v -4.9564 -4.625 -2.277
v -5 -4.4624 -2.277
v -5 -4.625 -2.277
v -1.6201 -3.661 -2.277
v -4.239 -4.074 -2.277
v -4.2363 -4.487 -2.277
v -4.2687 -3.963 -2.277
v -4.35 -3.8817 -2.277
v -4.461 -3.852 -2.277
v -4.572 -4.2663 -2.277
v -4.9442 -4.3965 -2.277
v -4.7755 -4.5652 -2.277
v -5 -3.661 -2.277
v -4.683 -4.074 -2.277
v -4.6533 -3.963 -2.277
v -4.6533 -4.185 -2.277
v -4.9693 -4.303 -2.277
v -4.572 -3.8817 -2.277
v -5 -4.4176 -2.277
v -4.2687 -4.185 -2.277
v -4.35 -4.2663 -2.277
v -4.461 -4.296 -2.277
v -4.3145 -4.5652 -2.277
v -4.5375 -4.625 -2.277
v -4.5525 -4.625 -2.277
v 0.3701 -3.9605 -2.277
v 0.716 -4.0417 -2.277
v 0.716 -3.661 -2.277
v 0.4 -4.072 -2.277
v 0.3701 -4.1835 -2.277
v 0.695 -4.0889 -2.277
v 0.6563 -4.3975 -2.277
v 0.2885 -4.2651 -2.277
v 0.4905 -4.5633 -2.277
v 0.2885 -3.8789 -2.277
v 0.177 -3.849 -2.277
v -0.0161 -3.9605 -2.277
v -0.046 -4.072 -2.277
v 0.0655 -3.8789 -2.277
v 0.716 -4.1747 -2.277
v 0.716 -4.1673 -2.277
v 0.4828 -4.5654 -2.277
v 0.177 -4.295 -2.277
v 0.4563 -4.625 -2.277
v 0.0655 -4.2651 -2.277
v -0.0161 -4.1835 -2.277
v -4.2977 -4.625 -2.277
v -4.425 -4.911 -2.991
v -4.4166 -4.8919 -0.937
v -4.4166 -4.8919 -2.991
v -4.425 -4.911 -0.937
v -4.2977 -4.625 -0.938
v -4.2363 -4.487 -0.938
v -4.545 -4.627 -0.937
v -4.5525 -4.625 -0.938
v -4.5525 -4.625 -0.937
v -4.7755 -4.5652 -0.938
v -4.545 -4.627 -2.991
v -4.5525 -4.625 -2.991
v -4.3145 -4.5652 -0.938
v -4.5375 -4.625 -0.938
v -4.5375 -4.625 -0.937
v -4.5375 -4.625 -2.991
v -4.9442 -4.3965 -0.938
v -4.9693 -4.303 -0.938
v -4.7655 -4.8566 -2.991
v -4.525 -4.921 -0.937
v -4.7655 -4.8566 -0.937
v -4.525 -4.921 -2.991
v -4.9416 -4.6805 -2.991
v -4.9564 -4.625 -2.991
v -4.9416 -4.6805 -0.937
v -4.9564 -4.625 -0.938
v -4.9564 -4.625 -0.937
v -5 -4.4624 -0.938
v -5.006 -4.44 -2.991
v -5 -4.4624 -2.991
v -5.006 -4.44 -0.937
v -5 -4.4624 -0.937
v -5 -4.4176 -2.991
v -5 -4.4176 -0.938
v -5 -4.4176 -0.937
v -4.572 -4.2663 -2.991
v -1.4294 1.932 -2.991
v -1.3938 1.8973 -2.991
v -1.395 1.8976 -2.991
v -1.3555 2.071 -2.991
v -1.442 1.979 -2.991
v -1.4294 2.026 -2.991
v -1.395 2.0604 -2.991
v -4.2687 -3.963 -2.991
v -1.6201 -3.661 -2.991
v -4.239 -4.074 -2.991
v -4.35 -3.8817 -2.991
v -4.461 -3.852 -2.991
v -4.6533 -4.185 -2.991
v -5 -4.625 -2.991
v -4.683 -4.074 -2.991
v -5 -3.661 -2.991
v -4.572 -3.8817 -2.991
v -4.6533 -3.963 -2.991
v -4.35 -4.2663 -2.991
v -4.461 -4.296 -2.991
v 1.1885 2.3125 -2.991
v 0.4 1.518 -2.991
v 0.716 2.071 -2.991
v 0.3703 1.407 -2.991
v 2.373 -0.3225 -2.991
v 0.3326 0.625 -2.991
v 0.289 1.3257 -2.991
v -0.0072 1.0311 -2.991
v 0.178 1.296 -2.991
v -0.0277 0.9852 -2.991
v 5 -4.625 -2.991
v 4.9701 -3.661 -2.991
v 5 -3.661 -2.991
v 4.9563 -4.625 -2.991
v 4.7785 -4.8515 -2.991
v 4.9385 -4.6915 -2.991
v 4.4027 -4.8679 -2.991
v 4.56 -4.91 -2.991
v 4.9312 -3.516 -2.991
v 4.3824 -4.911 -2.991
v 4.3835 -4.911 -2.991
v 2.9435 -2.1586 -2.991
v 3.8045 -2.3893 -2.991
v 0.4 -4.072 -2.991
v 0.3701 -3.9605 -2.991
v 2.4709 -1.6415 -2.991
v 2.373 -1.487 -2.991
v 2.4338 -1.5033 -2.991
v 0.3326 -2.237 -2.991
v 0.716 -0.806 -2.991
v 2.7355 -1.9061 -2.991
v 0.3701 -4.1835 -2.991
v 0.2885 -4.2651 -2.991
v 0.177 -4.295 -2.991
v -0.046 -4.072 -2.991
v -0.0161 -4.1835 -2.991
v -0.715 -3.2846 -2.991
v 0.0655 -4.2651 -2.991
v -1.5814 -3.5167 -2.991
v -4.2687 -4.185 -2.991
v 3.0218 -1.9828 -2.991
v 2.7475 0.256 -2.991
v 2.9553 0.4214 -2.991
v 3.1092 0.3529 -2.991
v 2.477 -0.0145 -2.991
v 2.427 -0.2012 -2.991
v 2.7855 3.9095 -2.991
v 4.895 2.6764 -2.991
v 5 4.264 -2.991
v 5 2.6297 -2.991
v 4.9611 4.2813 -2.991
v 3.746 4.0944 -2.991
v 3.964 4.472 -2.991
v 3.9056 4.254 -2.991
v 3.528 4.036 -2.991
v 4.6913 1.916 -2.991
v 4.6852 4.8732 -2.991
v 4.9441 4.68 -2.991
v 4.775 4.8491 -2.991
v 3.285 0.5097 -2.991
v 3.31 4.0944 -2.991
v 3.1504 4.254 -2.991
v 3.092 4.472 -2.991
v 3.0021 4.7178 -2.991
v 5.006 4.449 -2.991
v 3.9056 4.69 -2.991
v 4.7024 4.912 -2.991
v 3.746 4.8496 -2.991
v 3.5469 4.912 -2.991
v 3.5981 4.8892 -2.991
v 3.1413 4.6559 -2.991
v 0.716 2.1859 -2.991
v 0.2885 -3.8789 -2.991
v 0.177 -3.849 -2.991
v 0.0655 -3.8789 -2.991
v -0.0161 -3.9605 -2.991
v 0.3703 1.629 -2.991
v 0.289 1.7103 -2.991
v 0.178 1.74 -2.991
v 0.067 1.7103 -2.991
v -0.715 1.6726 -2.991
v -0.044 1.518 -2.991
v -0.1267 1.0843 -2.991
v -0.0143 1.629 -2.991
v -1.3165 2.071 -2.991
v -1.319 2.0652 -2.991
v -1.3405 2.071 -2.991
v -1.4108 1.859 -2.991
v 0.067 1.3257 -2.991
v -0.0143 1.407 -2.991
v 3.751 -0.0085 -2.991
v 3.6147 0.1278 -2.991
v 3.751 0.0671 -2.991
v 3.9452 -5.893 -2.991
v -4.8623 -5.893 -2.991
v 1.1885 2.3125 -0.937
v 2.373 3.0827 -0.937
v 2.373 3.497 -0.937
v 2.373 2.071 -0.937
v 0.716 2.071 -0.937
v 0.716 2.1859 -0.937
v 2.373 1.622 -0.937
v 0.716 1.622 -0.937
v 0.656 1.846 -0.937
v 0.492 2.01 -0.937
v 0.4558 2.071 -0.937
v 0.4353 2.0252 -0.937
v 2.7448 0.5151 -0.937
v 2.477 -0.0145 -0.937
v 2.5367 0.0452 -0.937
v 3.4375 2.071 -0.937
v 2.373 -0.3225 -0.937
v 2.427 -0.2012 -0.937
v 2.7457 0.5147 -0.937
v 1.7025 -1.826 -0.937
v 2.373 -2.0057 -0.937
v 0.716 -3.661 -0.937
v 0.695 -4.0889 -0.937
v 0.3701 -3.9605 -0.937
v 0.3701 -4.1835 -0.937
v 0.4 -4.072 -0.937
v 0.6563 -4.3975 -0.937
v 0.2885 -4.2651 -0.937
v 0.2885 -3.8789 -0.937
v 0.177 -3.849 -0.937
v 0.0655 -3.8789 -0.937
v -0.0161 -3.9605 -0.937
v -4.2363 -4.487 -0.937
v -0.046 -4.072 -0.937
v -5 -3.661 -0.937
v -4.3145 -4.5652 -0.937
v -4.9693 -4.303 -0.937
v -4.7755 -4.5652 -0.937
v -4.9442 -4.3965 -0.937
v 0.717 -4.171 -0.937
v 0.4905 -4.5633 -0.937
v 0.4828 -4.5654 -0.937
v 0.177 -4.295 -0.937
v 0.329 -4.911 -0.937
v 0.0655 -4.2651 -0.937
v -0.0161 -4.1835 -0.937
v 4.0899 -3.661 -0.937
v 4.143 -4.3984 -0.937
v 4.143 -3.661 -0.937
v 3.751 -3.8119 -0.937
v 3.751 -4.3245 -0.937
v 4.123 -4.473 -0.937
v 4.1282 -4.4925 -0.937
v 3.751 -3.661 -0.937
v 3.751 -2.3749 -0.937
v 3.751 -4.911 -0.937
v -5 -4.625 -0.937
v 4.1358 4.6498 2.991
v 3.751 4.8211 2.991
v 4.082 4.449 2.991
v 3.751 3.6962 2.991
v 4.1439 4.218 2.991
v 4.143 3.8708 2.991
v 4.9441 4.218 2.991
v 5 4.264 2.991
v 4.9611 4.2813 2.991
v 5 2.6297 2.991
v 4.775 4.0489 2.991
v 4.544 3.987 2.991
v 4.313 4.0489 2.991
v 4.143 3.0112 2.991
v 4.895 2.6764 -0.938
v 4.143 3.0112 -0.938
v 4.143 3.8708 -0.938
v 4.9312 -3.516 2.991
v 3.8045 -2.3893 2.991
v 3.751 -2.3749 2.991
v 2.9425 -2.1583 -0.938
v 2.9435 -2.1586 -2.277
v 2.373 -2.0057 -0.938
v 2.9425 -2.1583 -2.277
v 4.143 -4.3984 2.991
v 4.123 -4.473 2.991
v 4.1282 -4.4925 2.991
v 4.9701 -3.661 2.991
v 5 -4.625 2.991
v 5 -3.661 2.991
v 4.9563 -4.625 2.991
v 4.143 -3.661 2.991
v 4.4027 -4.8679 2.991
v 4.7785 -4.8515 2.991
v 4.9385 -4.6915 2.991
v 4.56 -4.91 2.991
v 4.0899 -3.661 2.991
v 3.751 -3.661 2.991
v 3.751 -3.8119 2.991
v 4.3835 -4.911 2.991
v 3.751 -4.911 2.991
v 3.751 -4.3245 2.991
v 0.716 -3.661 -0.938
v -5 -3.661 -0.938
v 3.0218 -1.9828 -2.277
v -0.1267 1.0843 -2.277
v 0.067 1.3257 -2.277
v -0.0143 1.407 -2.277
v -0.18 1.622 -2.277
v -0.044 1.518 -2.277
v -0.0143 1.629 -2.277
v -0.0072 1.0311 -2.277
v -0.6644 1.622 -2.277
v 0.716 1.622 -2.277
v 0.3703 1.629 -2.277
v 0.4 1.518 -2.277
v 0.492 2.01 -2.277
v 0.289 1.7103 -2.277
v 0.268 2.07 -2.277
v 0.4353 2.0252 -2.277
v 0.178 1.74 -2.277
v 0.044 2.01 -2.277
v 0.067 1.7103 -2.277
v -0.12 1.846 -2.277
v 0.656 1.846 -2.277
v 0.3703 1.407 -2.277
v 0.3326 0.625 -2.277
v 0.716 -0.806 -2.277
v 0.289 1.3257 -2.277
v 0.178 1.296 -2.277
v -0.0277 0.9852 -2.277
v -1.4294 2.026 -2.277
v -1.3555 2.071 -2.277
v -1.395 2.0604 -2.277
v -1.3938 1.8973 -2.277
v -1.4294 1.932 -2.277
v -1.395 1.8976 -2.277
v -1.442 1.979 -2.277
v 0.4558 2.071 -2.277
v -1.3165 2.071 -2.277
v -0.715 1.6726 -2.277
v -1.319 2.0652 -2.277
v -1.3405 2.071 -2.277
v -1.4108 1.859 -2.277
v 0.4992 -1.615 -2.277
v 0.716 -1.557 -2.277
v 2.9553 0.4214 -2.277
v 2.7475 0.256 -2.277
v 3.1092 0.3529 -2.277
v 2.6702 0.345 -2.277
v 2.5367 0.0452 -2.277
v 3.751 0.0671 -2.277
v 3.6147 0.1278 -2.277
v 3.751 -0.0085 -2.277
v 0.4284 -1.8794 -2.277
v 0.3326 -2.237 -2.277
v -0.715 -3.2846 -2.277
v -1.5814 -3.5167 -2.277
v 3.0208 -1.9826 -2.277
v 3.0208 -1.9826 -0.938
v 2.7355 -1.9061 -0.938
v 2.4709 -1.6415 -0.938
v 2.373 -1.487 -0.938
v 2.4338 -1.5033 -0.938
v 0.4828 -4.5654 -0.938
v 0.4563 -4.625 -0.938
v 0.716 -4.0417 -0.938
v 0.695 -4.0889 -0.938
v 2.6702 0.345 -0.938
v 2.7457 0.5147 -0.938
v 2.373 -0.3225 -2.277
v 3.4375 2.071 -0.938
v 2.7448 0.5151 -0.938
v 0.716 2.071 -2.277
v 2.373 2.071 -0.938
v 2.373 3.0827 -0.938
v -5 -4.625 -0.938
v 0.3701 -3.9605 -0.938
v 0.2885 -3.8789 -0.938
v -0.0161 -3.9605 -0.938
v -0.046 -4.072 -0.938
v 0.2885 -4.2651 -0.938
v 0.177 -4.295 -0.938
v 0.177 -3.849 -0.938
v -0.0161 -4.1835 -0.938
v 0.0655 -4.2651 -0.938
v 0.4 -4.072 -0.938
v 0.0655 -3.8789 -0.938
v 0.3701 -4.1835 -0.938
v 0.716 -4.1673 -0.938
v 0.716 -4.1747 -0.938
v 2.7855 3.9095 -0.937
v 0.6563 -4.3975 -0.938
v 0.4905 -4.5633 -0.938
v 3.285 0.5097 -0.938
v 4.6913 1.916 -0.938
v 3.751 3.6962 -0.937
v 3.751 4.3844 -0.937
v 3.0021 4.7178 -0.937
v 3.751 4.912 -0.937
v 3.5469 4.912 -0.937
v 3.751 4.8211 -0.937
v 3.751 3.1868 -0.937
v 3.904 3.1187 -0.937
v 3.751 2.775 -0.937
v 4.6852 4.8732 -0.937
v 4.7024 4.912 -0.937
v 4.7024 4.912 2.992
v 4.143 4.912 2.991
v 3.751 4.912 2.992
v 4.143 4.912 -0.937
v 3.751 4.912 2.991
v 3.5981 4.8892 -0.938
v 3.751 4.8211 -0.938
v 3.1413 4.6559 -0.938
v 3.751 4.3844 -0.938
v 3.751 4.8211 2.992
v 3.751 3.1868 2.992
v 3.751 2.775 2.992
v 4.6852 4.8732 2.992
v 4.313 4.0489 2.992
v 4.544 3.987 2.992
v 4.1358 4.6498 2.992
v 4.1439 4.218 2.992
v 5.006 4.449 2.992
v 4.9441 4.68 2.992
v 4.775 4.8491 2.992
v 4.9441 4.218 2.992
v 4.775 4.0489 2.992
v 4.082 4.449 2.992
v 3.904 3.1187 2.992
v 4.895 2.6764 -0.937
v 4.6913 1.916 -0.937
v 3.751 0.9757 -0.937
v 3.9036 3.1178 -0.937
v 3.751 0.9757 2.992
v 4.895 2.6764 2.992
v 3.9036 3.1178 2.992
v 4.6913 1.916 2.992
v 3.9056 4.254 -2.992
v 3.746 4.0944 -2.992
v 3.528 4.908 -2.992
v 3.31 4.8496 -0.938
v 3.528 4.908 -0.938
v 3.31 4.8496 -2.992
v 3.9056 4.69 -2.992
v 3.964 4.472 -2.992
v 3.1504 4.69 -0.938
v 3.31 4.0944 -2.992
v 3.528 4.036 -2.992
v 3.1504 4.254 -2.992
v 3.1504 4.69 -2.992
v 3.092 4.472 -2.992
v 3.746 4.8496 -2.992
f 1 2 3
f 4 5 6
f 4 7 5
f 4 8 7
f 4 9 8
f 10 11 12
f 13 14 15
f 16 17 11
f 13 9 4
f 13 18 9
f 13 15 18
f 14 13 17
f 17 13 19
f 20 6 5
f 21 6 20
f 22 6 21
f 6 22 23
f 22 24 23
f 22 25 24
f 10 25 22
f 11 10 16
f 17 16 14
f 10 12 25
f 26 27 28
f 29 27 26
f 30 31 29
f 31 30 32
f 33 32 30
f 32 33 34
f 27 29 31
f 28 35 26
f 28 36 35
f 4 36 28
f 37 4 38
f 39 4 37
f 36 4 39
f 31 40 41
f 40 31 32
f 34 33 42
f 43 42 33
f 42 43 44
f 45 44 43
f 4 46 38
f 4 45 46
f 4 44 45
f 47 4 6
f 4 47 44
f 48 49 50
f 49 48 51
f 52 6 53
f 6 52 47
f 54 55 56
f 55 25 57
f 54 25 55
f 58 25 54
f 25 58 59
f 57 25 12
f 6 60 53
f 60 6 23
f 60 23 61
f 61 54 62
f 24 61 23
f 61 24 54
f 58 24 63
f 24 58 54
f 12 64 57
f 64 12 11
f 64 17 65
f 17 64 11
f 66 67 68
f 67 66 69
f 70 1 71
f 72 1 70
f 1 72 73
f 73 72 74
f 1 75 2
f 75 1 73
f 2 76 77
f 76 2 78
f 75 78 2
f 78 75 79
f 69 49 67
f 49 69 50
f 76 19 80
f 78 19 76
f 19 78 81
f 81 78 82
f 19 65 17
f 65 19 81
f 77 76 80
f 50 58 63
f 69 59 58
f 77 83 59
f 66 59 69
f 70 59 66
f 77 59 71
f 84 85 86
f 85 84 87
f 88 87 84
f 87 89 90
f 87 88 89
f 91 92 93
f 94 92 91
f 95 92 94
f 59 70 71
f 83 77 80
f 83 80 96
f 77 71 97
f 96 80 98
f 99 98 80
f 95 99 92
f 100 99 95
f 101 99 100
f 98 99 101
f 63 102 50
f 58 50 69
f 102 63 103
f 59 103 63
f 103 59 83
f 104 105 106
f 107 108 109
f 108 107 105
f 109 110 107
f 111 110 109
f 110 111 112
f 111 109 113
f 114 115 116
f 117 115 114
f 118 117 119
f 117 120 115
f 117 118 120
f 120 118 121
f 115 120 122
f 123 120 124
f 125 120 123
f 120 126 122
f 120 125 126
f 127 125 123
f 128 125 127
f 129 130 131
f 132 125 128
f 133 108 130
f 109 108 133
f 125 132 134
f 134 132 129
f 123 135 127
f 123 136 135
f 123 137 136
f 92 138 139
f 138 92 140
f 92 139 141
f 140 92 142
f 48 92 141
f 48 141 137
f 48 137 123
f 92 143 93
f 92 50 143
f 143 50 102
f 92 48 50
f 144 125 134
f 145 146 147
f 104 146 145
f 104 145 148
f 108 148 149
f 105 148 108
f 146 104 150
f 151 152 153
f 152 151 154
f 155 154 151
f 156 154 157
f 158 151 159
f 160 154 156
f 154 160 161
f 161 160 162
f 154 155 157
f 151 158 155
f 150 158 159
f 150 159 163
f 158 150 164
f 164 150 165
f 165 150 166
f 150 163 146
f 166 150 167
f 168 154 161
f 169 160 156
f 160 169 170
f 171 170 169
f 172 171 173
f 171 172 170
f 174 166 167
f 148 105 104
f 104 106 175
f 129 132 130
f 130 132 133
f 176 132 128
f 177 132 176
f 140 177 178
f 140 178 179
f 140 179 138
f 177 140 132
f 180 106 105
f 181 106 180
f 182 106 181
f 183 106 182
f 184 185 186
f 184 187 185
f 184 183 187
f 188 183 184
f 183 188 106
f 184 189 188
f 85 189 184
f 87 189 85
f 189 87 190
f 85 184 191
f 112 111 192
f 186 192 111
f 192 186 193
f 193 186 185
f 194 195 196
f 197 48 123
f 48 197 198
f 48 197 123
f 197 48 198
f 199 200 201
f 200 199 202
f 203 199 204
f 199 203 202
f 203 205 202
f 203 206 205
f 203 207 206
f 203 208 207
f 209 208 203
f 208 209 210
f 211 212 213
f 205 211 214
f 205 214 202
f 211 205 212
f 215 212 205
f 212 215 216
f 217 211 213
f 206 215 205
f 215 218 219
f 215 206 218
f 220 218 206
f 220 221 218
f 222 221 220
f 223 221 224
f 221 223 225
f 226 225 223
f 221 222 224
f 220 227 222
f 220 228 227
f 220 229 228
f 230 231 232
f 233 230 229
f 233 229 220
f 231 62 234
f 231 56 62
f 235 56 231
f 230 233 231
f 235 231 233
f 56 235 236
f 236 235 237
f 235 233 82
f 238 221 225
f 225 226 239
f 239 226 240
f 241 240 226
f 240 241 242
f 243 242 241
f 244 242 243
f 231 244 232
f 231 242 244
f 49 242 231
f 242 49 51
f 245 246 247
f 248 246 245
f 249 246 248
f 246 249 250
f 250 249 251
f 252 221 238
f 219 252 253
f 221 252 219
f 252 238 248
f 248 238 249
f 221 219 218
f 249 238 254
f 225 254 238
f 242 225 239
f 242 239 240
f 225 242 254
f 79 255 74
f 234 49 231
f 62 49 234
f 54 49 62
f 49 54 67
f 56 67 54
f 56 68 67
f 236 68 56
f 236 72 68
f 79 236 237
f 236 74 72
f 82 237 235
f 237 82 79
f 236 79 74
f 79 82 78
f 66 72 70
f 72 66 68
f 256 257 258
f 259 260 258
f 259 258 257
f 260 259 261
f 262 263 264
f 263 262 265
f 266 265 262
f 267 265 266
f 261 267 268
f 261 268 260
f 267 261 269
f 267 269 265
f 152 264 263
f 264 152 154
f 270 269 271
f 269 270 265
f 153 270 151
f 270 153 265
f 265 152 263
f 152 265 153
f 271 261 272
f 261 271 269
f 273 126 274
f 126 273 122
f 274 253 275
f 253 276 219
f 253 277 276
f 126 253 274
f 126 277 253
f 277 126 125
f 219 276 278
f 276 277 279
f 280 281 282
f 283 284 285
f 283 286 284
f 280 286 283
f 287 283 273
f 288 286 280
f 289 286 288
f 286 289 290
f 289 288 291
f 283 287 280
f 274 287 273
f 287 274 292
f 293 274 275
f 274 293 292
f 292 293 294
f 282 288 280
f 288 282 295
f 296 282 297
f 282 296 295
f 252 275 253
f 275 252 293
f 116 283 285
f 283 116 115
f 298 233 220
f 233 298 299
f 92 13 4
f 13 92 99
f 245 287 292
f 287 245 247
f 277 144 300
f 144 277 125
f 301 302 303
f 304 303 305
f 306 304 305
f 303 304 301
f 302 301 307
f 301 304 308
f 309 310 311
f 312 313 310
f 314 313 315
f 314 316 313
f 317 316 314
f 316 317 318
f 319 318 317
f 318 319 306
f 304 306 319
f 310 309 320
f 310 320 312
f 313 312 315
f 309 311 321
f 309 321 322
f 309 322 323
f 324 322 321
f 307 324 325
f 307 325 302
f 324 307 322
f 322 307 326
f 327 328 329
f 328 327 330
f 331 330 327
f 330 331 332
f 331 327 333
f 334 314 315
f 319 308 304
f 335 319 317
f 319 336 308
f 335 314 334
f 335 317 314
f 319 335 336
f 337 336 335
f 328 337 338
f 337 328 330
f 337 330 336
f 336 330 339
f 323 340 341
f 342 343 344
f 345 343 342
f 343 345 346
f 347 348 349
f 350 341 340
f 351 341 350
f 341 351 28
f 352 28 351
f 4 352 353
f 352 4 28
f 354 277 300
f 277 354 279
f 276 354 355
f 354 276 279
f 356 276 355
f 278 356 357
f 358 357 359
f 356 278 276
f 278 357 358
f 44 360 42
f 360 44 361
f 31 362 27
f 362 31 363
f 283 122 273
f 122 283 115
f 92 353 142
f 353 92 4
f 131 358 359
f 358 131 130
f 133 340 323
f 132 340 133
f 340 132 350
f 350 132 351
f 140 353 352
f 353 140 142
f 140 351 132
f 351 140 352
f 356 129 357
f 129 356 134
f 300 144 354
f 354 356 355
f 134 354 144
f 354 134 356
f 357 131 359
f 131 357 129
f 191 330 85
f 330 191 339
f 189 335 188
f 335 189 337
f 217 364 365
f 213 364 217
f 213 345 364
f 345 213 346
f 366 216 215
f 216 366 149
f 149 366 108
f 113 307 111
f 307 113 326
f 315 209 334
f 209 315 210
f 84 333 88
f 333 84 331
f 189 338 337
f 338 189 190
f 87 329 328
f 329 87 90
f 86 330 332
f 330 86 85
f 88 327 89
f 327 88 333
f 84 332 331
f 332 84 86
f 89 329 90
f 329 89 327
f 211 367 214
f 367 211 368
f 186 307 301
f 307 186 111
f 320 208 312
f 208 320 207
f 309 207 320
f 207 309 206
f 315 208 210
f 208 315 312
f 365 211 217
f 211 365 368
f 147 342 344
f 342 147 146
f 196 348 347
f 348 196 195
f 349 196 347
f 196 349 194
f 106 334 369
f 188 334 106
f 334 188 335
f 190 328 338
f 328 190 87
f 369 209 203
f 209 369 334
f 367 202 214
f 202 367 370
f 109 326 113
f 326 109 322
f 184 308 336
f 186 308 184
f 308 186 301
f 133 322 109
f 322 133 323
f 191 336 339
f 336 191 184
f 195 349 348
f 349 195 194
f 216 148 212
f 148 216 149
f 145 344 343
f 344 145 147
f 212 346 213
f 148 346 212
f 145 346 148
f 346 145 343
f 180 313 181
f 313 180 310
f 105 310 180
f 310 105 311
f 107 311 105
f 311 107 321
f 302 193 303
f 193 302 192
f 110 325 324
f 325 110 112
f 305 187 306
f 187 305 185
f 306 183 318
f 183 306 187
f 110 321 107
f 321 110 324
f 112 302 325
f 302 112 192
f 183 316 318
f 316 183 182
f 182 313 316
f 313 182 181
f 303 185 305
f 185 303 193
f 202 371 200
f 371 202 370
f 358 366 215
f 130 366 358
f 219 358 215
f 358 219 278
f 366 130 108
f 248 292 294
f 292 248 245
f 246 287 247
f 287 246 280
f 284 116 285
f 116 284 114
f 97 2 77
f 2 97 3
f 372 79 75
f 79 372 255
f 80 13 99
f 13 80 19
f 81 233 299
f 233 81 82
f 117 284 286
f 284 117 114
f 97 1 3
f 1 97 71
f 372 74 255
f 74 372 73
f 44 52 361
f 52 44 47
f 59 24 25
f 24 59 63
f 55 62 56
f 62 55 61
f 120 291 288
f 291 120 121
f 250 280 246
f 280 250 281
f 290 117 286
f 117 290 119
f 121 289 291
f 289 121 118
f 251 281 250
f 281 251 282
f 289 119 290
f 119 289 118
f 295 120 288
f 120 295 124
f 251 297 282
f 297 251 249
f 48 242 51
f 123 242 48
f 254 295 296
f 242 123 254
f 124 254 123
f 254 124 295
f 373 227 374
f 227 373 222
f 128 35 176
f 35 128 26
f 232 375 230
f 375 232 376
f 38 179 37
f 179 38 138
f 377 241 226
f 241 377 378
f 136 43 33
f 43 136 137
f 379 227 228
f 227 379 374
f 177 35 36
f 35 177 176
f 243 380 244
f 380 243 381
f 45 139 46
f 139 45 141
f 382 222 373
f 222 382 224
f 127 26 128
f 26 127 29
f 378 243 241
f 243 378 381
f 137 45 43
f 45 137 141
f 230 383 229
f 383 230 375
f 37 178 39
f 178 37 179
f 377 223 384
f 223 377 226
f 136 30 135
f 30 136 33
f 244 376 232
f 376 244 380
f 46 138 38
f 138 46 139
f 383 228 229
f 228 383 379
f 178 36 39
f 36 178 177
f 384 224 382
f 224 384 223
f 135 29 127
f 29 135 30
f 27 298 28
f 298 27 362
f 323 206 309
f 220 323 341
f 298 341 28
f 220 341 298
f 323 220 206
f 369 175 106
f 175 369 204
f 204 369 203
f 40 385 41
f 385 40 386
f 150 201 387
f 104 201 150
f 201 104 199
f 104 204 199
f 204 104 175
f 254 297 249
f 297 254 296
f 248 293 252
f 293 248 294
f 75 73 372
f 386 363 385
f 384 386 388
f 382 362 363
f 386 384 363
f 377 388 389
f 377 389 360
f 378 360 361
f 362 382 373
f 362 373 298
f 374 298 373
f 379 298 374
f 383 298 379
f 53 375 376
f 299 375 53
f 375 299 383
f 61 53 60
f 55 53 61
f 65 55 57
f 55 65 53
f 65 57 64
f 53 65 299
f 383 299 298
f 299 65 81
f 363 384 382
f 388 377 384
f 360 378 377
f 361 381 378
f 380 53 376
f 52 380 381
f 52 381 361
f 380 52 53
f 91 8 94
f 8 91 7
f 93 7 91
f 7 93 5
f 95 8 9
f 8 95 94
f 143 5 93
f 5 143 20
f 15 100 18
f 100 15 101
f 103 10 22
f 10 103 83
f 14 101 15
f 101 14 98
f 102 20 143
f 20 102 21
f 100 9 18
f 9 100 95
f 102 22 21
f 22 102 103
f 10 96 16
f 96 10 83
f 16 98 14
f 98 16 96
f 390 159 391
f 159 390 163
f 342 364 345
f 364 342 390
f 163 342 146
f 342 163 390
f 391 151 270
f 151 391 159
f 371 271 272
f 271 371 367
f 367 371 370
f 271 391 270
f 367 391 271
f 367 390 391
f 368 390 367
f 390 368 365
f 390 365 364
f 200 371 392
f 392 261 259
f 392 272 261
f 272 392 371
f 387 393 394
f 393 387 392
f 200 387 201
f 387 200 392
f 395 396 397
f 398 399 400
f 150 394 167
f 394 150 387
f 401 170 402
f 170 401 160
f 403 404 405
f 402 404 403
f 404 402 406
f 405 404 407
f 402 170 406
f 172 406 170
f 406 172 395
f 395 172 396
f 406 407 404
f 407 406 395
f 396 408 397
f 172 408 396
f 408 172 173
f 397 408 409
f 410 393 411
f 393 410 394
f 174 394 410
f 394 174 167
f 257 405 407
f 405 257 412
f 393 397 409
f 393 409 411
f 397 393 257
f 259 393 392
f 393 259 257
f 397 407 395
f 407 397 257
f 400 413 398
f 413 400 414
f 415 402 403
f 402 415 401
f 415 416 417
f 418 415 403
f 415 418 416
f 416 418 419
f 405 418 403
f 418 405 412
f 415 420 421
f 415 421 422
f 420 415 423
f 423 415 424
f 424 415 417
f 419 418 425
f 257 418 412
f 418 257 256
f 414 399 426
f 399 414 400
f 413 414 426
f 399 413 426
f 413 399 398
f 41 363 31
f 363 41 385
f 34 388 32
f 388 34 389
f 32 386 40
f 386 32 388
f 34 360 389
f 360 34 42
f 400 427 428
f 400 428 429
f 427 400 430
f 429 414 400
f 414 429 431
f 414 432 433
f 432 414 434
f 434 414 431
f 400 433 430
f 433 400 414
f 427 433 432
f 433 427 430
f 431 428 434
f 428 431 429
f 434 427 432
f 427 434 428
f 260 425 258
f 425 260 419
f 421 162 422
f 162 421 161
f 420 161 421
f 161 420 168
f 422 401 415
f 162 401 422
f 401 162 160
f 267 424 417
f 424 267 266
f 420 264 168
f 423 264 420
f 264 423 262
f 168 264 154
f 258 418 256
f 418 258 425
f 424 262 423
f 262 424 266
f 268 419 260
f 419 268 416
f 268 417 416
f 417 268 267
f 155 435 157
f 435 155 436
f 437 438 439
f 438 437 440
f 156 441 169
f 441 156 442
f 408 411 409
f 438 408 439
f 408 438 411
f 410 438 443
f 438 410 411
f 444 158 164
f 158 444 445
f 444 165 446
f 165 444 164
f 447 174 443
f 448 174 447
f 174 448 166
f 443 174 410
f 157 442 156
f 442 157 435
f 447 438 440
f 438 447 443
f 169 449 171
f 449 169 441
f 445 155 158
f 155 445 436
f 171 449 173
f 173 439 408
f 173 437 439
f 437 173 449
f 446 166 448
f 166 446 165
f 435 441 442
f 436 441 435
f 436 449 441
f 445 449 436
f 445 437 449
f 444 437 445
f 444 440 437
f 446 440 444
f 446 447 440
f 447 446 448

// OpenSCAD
intersection() {
translate([-6, -5.893, -3.589]) cube(size = [12, 11.786, 7.179], center = false);
union() {
difference() {
translate([-4.525, -4.44, -2.991])
cylinder(h = 2.054, r1 = 0.481, r2 = 0.481, center = false, $fn = 12);
union() {
rotate([0, 0, -24])
translate([-2.045, -18.1, -2.277]) cube(size = [5.612, 15.675, 5.268], center = false);
rotate([180, 0, 180])
translate([4.545, -4.166, -2.991])
cylinder(h = 21.091, r1 = 0.461, r2 = 0.461, center = false, $fn = 12);
}
}
intersection() {
rotate([0, 0, -24])
translate([-2.045, 4.436, -2.991]) cube(size = [20.145, 1.493, 5.982], center = false);
translate([4.143, 2.071, -2.991]) cube(size = [0.857, 16.029, 5.982], center = false);
}
intersection() {
union() {
rotate([0, 0, -24])
translate([-2.045, -18.1, -2.991]) cube(size = [5.612, 36.2, 0.714], center = false);
intersection() {
rotate([0, 0, 0])
translate([1.165, -6.961, -2.991])
cylinder(h = 21.091, r1 = 5.279, r2 = 5.279, center = false, $fn = 12);
translate([3.751, -3.661, -2.991]) cube(size = [1.249, 21.761, 5.982], center = false);
}
rotate([0, 0, -24])
translate([2.298, -18.1, -2.277]) cube(size = [1.268, 36.2, 1.339], center = false);
}
difference() {
intersection() {
rotate([0, 0, 0])
translate([1.675, -4.937, -18.1])
cylinder(h = 21.091, r1 = 3.637, r2 = 3.637, center = false, $fn = 12);
translate([-5, -3.661, -2.991]) cube(size = [10, 21.761, 21.091], center = false);
}
union() {
translate([-2.146, -0.806, -18.1])
cylinder(h = 15.823, r1 = 2.862, r2 = 2.862, center = false, $fn = 12);
rotate([180, 0, 180])
translate([-3.097, -1.28, -2.991])
cylinder(h = 21.091, r1 = 0.723, r2 = 0.723, center = false, $fn = 12);
}
}
}
difference() {
intersection() {
union() {
rotate([0, 0, -24])
translate([-2.045, 0.939, -2.991]) cube(size = [20.145, 3.498, 0.714], center = false);
rotate([0, 0, -24])
translate([-0.426, -18.1, -2.991]) cube(size = [2.725, 22.537, 5.982], center = false);
translate([-1.348, 1.979, -18.1])
cylinder(h = 15.823, r1 = 0.094, r2 = 0.094, center = false, $fn = 12);
}
union() {
difference() {
rotate([0, 0, -24])
translate([-18.1, 0.939, -2.991]) cube(size = [20.398, 4.991, 21.091], center = false);
rotate([0, 0, 0])
translate([0.268, 1.622, -2.277])
cylinder(h = 20.377, r1 = 0.448, r2 = 0.448, center = false, $fn = 12);
}
difference() {
rotate([0, 0, -24])
translate([-0.426, -18.1, -2.991]) cube(size = [18.526, 19.687, 2.054], center = false);
rotate([0, 0, 0])
translate([1.165, -6.961, -18.1])
cylinder(h = 36.2, r1 = 5.279, r2 = 5.279, center = false, $fn = 12);
}
}
}
union() {
translate([-2.146, -0.806, -2.991])
cylinder(h = 0.714, r1 = 2.862, r2 = 2.862, center = false, $fn = 12);
rotate([0, 0, 0])
translate([3.117, -0.384, -2.991])
cylinder(h = 2.054, r1 = 0.739, r2 = 0.739, center = false, $fn = 12);
difference() {
rotate([0, 0, -24])
translate([-2.045, 0.939, -2.991]) cube(size = [20.145, 3.498, 5.982], center = false);
translate([-18.1, -18.1, -2.991]) cube(size = [21.851, 20.171, 2.054], center = false);
}
translate([0.178, 1.518, -2.991])
cylinder(h = 21.091, r1 = 0.222, r2 = 0.222, center = false, $fn = 12);
translate([-18.1, 2.071, -2.991]) cube(size = [20.473, 2.841, 0.714], center = false);
translate([-18.1, -18.1, -2.277]) cube(size = [20.473, 19.722, 5.268], center = false);
}
}
translate([4.544, 4.449, -0.937])
cylinder(h = 3.929, r1 = 0.462, r2 = 0.462, center = false, $fn = 12);
difference() {
union() {
intersection() {
union() {
rotate([-180, 0, 24])
translate([-18.1, -18.1, -2.991]) cube(size = [36.2, 23.108, 5.982], center = false);
translate([4.143, -18.1, -2.991]) cube(size = [13.957, 36.2, 5.982], center = false);
}
translate([-5, -4.625, -18.1]) cube(size = [10, 22.725, 21.091], center = false);
}
intersection() {
union() {
rotate([180, 0, 180])
translate([-4.56, -4.473, -2.991])
cylinder(h = 5.982, r1 = 0.437, r2 = 0.437, center = false, $fn = 12);
rotate([0, 0, -24])
translate([-2.045, -18.1, -2.991]) cube(size = [8.047, 15.675, 5.982], center = false);
}
union() {
translate([-18.1, -4.911, -2.991]) cube(size = [23.1, 1.25, 5.982], center = false);
rotate([0, 0, -24])
translate([-18.1, -18.1, -18.1]) cube(size = [24.101, 15.675, 15.109], center = false);
}
}
}
union() {
rotate([180, 0, 180])
translate([-0.177, -4.072, -18.1])
cylinder(h = 36.2, r1 = 0.223, r2 = 0.223, center = false, $fn = 12);
translate([-18.1, -3.661, -18.1]) cube(size = [18.816, 21.761, 21.091], center = false);
rotate([0, 0, -24])
translate([-2.045, -18.1, -0.937]) cube(size = [5.612, 36.2, 3.929], center = false);
translate([-0.993, 6.091, -18.1])
cylinder(h = 21.091, r1 = 4.363, r2 = 4.363, center = false, $fn = 12);
translate([2.373, -3.661, -2.991]) cube(size = [2.627, 21.761, 5.982], center = false);
translate([-18.1, -4.911, -0.937]) cube(size = [21.851, 23.011, 3.929], center = false);
translate([-5, -4.625, -2.277]) cube(size = [5.716, 22.725, 1.339], center = false);
translate([-4.461, -4.074, -2.991])
cylinder(h = 0.714, r1 = 0.222, r2 = 0.222, center = false, $fn = 12);
}
}
intersection() {
difference() {
difference() {
rotate([0, 0, 0])
translate([1.364, 3.837, -18.1])
cylinder(h = 21.091, r1 = 3.842, r2 = 3.842, center = false, $fn = 12);
rotate([-180, 0, 24])
translate([-18.1, -1.851, -18.1]) cube(size = [36.2, 19.951, 19.038], center = false);
}
union() {
translate([-0.993, 6.091, -18.1])
cylinder(h = 17.163, r1 = 4.363, r2 = 4.363, center = false, $fn = 12);
rotate([0, 0, -24])
translate([2.298, 5.531, -2.991]) cube(size = [15.802, 12.569, 2.054], center = false);
}
}
union() {
translate([3.751, -18.1, -2.991]) cube(size = [0.392, 23.012, 5.982], center = false);
difference() {
translate([2.373, -18.1, -2.991]) cube(size = [2.627, 23.012, 2.054], center = false);
rotate([0, 0, -24])
translate([-0.426, 5.531, -18.1]) cube(size = [18.526, 0.399, 17.163], center = false);
}
}
}
difference() {
difference() {
union() {
rotate([0, 0, -24])
translate([-18.1, 5.93, -0.937]) cube(size = [20.398, 12.17, 3.929], center = false);
rotate([0, 0, -24])
translate([-18.1, -18.1, -0.937]) cube(size = [20.398, 22.537, 3.929], center = false);
}
translate([-18.1, 4.912, -18.1]) cube(size = [36.2, 13.188, 36.2], center = false);
}
translate([-18.1, -18.1, -0.937]) cube(size = [21.851, 36.2, 19.038], center = false);
}
rotate([180, 0, 180])
translate([-3.528, 4.472, 0.938])
cylinder(h = 2.054, r1 = 0.436, r2 = 0.436, center = false, $fn = 12);
intersection() {
rotate([0, 0, -24])
translate([2.298, -18.1, -2.991]) cube(size = [3.703, 36.2, 2.054], center = false);
translate([-18.1, -4.911, -18.1]) cube(size = [22.243, 23.011, 17.163], center = false);
difference() {
rotate([0, 0, 0])
translate([1.165, -6.961, -2.991])
cylinder(h = 2.054, r1 = 5.279, r2 = 5.279, center = false, $fn = 12);
rotate([0, 0, 0])
translate([0.264, -4.171, -2.277])
cylinder(h = 20.377, r1 = 0.453, r2 = 0.453, center = false, $fn = 12);
}
}
intersection() {
rotate([0, 0, -24])
translate([2.298, 1.587, -0.937]) cube(size = [15.802, 2.849, 3.929], center = false);
union() {
translate([3.751, -18.1, -0.937]) cube(size = [1.249, 23.012, 19.038], center = false);
rotate([0, 0, -24])
translate([-2.045, -18.1, -2.991]) cube(size = [1.619, 19.039, 0.714], center = false);
}
rotate([0, 0, 0])
translate([1.364, 3.837, -2.991])
cylinder(h = 21.091, r1 = 3.842, r2 = 3.842, center = false, $fn = 12);
}
translate([4.544, 4.449, -2.991])
cylinder(h = 5.982, r1 = 0.462, r2 = 0.462, center = false, $fn = 12);
}
}
